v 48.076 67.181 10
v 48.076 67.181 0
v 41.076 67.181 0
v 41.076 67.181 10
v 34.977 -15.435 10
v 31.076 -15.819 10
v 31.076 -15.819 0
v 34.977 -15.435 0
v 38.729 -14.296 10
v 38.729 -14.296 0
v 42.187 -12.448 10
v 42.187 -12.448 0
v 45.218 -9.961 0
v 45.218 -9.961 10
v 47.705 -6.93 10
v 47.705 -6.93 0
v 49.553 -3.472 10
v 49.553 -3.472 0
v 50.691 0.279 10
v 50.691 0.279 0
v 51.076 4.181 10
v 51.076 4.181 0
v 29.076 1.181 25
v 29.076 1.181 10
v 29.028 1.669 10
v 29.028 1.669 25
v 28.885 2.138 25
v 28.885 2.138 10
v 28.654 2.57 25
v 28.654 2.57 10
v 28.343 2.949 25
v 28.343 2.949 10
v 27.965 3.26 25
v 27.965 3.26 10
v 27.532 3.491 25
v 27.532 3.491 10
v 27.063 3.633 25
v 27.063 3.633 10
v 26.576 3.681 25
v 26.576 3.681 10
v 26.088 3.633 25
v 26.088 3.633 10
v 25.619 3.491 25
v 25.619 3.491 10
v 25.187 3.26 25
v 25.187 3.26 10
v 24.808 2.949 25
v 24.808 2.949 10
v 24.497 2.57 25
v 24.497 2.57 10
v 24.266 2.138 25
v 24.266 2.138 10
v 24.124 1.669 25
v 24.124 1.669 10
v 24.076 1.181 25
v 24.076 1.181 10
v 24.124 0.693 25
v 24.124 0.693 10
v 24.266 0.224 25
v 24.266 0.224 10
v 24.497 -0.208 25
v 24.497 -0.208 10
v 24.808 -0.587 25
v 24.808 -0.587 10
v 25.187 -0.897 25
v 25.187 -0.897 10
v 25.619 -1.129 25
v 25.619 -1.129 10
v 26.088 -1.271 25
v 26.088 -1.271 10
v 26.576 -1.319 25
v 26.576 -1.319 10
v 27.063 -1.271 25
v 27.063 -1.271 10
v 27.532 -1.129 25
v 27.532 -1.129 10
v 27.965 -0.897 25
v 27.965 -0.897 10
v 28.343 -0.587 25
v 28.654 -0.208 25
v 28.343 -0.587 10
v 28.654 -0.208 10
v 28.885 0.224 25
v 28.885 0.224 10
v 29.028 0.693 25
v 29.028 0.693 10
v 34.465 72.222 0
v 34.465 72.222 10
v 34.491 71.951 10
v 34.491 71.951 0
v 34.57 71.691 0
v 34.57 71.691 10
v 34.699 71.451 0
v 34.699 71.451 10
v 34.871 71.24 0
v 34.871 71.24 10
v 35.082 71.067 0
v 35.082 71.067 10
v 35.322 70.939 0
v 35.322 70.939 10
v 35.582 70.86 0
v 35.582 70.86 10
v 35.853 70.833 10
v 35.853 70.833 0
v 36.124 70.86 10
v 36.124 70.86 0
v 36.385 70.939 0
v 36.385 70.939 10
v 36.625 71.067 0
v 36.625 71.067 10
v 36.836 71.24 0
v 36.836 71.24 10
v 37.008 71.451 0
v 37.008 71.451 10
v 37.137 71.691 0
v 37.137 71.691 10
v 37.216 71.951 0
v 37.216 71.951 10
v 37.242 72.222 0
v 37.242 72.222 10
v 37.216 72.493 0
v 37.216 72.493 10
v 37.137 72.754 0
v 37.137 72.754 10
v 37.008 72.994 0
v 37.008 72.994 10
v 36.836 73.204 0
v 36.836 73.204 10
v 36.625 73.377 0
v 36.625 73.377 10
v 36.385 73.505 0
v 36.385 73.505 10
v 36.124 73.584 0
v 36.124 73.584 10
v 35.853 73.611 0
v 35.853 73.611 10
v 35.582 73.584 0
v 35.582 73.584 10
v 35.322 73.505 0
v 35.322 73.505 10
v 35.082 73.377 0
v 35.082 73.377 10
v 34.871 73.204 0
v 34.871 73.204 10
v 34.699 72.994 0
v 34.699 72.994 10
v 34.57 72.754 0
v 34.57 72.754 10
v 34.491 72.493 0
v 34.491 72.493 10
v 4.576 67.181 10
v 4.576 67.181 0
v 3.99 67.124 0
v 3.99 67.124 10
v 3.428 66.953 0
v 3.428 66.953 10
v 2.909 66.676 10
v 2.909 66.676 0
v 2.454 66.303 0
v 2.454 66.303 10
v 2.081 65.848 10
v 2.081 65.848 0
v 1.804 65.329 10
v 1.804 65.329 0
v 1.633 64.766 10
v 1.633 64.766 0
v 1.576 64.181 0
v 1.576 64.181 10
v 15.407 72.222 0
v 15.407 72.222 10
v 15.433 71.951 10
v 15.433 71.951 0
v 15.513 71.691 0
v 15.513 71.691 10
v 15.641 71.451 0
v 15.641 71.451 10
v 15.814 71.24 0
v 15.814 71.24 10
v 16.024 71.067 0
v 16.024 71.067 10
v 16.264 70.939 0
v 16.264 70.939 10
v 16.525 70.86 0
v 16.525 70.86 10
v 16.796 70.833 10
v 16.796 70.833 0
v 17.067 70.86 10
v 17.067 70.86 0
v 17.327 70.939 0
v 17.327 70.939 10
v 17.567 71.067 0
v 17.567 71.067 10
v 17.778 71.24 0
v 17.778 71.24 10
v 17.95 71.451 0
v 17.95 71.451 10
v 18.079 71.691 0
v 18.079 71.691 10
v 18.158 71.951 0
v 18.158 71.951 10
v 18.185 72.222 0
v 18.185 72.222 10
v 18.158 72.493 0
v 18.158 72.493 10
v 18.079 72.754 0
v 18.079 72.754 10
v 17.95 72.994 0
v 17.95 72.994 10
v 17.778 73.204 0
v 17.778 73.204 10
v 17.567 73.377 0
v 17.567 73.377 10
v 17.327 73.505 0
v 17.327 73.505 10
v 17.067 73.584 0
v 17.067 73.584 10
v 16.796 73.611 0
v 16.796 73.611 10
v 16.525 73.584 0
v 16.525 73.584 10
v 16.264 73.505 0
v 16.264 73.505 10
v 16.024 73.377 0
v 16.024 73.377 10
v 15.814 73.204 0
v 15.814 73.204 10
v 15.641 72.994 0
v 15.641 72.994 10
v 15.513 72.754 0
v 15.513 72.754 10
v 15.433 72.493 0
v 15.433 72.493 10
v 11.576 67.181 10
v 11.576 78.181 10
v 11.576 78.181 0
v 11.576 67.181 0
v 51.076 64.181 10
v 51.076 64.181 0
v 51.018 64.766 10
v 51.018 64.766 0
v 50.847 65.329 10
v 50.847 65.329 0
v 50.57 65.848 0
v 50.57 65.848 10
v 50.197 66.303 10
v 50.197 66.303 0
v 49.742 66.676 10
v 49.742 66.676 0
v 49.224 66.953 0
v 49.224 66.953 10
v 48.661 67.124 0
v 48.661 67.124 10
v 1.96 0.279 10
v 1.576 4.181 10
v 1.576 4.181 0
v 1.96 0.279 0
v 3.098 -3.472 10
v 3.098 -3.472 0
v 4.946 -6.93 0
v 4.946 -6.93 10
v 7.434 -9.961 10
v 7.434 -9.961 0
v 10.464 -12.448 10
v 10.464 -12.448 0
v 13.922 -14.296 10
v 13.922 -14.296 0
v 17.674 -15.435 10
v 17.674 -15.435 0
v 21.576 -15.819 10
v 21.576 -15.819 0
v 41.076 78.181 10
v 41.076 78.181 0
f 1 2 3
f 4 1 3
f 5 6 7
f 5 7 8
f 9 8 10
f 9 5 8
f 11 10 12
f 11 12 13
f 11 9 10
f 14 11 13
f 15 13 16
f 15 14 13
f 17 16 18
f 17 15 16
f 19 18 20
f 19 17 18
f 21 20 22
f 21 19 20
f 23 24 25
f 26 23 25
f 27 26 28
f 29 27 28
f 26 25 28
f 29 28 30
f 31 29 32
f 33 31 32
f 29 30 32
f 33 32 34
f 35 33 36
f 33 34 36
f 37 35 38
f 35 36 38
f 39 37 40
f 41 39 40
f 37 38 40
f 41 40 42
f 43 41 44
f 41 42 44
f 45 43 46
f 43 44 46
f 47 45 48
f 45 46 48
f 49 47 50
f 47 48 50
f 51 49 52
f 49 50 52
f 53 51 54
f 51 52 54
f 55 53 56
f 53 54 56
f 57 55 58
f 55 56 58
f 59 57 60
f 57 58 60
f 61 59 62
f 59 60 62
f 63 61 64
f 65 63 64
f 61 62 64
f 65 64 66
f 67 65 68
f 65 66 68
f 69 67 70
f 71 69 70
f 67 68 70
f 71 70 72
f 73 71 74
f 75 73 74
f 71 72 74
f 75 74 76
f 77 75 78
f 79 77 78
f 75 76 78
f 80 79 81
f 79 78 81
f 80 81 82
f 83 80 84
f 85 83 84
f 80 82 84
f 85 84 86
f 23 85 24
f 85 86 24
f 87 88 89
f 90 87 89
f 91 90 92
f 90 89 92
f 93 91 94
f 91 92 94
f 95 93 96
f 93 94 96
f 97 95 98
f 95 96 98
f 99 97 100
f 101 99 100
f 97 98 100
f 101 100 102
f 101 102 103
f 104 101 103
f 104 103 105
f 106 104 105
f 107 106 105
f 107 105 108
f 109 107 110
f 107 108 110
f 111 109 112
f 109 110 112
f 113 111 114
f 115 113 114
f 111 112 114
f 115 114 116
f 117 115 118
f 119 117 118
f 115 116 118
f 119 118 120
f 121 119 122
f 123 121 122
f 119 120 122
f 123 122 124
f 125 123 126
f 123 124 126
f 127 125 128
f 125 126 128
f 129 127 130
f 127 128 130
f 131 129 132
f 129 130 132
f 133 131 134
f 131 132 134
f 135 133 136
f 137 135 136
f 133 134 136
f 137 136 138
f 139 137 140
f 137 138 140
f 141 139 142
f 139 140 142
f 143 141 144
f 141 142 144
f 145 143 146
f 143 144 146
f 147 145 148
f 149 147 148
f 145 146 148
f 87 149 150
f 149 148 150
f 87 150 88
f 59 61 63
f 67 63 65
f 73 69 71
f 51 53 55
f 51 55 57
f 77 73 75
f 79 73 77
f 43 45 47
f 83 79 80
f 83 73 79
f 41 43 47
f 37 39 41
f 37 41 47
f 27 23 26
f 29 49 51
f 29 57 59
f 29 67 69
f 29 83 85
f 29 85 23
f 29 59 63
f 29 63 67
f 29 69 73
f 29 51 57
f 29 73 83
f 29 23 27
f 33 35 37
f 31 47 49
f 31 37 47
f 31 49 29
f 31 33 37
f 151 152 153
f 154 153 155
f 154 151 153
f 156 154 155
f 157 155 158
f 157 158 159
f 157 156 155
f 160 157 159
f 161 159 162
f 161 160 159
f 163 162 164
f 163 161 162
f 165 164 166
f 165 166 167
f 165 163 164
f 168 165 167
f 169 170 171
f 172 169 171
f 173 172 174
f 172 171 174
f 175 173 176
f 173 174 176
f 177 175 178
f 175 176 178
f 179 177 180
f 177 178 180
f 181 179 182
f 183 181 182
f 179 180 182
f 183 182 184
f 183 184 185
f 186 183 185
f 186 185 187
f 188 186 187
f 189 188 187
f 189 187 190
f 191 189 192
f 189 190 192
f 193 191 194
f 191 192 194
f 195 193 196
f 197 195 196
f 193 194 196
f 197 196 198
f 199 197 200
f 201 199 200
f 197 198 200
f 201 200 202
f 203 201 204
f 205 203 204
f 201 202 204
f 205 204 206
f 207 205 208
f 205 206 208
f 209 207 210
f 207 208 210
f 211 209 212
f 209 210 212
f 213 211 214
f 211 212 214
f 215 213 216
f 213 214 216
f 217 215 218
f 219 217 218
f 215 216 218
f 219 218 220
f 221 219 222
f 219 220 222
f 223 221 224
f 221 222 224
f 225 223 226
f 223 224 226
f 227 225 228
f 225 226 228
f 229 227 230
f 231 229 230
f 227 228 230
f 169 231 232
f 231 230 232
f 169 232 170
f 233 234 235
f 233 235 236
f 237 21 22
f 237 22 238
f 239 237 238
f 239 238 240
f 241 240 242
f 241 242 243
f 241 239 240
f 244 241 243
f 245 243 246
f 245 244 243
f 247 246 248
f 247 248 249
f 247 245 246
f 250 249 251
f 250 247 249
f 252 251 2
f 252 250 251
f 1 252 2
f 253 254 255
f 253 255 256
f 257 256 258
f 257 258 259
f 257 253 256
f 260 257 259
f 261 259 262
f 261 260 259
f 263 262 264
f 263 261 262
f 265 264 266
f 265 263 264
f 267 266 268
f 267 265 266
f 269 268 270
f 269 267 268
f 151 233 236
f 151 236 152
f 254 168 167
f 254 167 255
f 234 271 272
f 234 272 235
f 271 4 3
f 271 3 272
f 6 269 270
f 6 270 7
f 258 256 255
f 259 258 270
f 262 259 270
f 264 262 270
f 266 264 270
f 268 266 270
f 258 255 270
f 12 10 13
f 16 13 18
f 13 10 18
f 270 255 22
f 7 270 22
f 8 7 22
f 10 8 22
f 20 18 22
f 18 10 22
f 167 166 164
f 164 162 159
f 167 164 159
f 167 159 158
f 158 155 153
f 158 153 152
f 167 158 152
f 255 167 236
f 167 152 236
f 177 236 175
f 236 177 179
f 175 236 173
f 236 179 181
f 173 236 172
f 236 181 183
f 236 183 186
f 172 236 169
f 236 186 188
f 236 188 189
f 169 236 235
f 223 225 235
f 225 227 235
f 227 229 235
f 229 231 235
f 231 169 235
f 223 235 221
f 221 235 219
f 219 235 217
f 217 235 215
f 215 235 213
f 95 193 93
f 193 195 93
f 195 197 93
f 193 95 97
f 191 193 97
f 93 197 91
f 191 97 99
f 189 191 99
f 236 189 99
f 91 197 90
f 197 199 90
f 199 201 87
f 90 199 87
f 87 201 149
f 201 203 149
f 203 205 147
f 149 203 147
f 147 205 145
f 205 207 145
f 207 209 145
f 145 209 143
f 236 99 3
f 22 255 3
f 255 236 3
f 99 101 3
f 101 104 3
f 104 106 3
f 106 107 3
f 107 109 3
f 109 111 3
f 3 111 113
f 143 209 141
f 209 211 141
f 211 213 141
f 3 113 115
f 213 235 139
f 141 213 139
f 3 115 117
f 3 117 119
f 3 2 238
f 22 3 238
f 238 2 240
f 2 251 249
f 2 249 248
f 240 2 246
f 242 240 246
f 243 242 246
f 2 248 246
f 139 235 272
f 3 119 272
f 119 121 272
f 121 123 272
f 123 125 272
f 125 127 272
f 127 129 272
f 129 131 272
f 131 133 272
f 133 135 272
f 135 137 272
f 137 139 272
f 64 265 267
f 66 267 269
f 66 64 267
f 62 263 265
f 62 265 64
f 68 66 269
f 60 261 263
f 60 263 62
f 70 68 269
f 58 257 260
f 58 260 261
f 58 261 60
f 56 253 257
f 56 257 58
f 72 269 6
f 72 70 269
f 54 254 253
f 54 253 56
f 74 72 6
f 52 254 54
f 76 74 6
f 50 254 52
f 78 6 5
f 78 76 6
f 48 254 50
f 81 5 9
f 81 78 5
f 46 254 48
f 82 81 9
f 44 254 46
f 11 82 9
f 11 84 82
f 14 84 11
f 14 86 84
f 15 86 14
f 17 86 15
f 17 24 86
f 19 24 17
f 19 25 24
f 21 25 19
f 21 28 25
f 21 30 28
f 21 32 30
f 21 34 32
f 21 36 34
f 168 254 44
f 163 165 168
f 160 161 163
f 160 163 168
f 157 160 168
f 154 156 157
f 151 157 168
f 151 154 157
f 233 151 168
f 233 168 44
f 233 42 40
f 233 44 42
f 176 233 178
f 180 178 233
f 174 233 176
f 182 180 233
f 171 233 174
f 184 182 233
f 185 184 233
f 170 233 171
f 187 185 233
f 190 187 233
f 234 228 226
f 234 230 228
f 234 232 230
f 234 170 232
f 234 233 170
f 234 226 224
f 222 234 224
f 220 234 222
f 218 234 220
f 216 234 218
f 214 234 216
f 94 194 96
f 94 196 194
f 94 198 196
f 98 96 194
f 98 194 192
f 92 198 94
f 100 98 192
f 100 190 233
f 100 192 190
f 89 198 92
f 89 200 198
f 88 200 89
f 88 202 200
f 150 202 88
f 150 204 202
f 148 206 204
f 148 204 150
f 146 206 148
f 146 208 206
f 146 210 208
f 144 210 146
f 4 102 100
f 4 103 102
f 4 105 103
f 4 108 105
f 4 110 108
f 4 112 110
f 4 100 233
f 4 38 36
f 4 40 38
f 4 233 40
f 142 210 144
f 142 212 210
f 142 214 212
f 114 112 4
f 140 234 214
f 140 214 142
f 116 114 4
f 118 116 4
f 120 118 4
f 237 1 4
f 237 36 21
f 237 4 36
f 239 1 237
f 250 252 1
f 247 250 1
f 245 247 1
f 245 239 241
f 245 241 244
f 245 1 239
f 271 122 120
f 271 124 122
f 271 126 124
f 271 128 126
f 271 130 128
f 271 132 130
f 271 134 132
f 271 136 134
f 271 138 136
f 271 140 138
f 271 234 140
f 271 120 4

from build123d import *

# Parameters (mm, degrees)
IZIM1_R                     = 1.388888889
Y_KSEKLIK_EKSTR_ZYON1_DEPTH = 10
IZIM2_R                     = 2.5
Y_KSEKLIK_EKSTR_ZYON2_DEPTH = 15


with BuildPart() as part:
    # Çizim1 → Yükseklik-Ekstrüzyon1 (new body)
    with BuildSketch(Plane.XY.offset(10)):
        with BuildLine():
            Line((11.575672227, 67.181181276), (4.575672227, 67.181181276))
            ThreePointArc((4.575672227, 67.181181276), (2.454351883, 66.30250162), (1.575672227, 64.181181276))
            Line((1.575672227, 64.181181276), (1.575672227, 4.181181276))
            ThreePointArc((1.575672227, 4.181181276), (7.433536603, -9.960954347), (21.575672227, -15.818818724))
            Line((21.575672227, -15.818818724), (31.075672227, -15.818818724))
            ThreePointArc((31.075672227, -15.818818724), (45.21780785, -9.960954347), (51.075672227, 4.181181276))
            Line((51.075672227, 4.181181276), (51.075672227, 64.181181276))
            ThreePointArc((51.075672227, 64.181181276), (50.19699257, 66.30250162), (48.075672227, 67.181181276))
            Line((48.075672227, 67.181181276), (41.075672227, 67.181181276))
            Line((41.075672227, 67.181181276), (41.075672227, 78.181181276))
            Line((41.075672227, 78.181181276), (11.575672227, 78.181181276))
            Line((11.575672227, 78.181181276), (11.575672227, 67.181181276))
        make_face()
        with Locations(Location((16.795672227, 72.222222222, 0), (0, 0, 180))):
            Circle(IZIM1_R, mode=Mode.SUBTRACT)
        with Locations(Location((35.853450004, 72.222222222, 0), (0, 0, 180))):
            Circle(IZIM1_R, mode=Mode.SUBTRACT)
    extrude(amount=-Y_KSEKLIK_EKSTR_ZYON1_DEPTH)

    # Çizim2 → Yükseklik-Ekstrüzyon2 (add)
    with BuildSketch(Plane.XY.offset(10)):
        with Locations((26.575672227, 1.181181276)):
            Circle(IZIM2_R)
    extrude(amount=Y_KSEKLIK_EKSTR_ZYON2_DEPTH)


solid = part.part
